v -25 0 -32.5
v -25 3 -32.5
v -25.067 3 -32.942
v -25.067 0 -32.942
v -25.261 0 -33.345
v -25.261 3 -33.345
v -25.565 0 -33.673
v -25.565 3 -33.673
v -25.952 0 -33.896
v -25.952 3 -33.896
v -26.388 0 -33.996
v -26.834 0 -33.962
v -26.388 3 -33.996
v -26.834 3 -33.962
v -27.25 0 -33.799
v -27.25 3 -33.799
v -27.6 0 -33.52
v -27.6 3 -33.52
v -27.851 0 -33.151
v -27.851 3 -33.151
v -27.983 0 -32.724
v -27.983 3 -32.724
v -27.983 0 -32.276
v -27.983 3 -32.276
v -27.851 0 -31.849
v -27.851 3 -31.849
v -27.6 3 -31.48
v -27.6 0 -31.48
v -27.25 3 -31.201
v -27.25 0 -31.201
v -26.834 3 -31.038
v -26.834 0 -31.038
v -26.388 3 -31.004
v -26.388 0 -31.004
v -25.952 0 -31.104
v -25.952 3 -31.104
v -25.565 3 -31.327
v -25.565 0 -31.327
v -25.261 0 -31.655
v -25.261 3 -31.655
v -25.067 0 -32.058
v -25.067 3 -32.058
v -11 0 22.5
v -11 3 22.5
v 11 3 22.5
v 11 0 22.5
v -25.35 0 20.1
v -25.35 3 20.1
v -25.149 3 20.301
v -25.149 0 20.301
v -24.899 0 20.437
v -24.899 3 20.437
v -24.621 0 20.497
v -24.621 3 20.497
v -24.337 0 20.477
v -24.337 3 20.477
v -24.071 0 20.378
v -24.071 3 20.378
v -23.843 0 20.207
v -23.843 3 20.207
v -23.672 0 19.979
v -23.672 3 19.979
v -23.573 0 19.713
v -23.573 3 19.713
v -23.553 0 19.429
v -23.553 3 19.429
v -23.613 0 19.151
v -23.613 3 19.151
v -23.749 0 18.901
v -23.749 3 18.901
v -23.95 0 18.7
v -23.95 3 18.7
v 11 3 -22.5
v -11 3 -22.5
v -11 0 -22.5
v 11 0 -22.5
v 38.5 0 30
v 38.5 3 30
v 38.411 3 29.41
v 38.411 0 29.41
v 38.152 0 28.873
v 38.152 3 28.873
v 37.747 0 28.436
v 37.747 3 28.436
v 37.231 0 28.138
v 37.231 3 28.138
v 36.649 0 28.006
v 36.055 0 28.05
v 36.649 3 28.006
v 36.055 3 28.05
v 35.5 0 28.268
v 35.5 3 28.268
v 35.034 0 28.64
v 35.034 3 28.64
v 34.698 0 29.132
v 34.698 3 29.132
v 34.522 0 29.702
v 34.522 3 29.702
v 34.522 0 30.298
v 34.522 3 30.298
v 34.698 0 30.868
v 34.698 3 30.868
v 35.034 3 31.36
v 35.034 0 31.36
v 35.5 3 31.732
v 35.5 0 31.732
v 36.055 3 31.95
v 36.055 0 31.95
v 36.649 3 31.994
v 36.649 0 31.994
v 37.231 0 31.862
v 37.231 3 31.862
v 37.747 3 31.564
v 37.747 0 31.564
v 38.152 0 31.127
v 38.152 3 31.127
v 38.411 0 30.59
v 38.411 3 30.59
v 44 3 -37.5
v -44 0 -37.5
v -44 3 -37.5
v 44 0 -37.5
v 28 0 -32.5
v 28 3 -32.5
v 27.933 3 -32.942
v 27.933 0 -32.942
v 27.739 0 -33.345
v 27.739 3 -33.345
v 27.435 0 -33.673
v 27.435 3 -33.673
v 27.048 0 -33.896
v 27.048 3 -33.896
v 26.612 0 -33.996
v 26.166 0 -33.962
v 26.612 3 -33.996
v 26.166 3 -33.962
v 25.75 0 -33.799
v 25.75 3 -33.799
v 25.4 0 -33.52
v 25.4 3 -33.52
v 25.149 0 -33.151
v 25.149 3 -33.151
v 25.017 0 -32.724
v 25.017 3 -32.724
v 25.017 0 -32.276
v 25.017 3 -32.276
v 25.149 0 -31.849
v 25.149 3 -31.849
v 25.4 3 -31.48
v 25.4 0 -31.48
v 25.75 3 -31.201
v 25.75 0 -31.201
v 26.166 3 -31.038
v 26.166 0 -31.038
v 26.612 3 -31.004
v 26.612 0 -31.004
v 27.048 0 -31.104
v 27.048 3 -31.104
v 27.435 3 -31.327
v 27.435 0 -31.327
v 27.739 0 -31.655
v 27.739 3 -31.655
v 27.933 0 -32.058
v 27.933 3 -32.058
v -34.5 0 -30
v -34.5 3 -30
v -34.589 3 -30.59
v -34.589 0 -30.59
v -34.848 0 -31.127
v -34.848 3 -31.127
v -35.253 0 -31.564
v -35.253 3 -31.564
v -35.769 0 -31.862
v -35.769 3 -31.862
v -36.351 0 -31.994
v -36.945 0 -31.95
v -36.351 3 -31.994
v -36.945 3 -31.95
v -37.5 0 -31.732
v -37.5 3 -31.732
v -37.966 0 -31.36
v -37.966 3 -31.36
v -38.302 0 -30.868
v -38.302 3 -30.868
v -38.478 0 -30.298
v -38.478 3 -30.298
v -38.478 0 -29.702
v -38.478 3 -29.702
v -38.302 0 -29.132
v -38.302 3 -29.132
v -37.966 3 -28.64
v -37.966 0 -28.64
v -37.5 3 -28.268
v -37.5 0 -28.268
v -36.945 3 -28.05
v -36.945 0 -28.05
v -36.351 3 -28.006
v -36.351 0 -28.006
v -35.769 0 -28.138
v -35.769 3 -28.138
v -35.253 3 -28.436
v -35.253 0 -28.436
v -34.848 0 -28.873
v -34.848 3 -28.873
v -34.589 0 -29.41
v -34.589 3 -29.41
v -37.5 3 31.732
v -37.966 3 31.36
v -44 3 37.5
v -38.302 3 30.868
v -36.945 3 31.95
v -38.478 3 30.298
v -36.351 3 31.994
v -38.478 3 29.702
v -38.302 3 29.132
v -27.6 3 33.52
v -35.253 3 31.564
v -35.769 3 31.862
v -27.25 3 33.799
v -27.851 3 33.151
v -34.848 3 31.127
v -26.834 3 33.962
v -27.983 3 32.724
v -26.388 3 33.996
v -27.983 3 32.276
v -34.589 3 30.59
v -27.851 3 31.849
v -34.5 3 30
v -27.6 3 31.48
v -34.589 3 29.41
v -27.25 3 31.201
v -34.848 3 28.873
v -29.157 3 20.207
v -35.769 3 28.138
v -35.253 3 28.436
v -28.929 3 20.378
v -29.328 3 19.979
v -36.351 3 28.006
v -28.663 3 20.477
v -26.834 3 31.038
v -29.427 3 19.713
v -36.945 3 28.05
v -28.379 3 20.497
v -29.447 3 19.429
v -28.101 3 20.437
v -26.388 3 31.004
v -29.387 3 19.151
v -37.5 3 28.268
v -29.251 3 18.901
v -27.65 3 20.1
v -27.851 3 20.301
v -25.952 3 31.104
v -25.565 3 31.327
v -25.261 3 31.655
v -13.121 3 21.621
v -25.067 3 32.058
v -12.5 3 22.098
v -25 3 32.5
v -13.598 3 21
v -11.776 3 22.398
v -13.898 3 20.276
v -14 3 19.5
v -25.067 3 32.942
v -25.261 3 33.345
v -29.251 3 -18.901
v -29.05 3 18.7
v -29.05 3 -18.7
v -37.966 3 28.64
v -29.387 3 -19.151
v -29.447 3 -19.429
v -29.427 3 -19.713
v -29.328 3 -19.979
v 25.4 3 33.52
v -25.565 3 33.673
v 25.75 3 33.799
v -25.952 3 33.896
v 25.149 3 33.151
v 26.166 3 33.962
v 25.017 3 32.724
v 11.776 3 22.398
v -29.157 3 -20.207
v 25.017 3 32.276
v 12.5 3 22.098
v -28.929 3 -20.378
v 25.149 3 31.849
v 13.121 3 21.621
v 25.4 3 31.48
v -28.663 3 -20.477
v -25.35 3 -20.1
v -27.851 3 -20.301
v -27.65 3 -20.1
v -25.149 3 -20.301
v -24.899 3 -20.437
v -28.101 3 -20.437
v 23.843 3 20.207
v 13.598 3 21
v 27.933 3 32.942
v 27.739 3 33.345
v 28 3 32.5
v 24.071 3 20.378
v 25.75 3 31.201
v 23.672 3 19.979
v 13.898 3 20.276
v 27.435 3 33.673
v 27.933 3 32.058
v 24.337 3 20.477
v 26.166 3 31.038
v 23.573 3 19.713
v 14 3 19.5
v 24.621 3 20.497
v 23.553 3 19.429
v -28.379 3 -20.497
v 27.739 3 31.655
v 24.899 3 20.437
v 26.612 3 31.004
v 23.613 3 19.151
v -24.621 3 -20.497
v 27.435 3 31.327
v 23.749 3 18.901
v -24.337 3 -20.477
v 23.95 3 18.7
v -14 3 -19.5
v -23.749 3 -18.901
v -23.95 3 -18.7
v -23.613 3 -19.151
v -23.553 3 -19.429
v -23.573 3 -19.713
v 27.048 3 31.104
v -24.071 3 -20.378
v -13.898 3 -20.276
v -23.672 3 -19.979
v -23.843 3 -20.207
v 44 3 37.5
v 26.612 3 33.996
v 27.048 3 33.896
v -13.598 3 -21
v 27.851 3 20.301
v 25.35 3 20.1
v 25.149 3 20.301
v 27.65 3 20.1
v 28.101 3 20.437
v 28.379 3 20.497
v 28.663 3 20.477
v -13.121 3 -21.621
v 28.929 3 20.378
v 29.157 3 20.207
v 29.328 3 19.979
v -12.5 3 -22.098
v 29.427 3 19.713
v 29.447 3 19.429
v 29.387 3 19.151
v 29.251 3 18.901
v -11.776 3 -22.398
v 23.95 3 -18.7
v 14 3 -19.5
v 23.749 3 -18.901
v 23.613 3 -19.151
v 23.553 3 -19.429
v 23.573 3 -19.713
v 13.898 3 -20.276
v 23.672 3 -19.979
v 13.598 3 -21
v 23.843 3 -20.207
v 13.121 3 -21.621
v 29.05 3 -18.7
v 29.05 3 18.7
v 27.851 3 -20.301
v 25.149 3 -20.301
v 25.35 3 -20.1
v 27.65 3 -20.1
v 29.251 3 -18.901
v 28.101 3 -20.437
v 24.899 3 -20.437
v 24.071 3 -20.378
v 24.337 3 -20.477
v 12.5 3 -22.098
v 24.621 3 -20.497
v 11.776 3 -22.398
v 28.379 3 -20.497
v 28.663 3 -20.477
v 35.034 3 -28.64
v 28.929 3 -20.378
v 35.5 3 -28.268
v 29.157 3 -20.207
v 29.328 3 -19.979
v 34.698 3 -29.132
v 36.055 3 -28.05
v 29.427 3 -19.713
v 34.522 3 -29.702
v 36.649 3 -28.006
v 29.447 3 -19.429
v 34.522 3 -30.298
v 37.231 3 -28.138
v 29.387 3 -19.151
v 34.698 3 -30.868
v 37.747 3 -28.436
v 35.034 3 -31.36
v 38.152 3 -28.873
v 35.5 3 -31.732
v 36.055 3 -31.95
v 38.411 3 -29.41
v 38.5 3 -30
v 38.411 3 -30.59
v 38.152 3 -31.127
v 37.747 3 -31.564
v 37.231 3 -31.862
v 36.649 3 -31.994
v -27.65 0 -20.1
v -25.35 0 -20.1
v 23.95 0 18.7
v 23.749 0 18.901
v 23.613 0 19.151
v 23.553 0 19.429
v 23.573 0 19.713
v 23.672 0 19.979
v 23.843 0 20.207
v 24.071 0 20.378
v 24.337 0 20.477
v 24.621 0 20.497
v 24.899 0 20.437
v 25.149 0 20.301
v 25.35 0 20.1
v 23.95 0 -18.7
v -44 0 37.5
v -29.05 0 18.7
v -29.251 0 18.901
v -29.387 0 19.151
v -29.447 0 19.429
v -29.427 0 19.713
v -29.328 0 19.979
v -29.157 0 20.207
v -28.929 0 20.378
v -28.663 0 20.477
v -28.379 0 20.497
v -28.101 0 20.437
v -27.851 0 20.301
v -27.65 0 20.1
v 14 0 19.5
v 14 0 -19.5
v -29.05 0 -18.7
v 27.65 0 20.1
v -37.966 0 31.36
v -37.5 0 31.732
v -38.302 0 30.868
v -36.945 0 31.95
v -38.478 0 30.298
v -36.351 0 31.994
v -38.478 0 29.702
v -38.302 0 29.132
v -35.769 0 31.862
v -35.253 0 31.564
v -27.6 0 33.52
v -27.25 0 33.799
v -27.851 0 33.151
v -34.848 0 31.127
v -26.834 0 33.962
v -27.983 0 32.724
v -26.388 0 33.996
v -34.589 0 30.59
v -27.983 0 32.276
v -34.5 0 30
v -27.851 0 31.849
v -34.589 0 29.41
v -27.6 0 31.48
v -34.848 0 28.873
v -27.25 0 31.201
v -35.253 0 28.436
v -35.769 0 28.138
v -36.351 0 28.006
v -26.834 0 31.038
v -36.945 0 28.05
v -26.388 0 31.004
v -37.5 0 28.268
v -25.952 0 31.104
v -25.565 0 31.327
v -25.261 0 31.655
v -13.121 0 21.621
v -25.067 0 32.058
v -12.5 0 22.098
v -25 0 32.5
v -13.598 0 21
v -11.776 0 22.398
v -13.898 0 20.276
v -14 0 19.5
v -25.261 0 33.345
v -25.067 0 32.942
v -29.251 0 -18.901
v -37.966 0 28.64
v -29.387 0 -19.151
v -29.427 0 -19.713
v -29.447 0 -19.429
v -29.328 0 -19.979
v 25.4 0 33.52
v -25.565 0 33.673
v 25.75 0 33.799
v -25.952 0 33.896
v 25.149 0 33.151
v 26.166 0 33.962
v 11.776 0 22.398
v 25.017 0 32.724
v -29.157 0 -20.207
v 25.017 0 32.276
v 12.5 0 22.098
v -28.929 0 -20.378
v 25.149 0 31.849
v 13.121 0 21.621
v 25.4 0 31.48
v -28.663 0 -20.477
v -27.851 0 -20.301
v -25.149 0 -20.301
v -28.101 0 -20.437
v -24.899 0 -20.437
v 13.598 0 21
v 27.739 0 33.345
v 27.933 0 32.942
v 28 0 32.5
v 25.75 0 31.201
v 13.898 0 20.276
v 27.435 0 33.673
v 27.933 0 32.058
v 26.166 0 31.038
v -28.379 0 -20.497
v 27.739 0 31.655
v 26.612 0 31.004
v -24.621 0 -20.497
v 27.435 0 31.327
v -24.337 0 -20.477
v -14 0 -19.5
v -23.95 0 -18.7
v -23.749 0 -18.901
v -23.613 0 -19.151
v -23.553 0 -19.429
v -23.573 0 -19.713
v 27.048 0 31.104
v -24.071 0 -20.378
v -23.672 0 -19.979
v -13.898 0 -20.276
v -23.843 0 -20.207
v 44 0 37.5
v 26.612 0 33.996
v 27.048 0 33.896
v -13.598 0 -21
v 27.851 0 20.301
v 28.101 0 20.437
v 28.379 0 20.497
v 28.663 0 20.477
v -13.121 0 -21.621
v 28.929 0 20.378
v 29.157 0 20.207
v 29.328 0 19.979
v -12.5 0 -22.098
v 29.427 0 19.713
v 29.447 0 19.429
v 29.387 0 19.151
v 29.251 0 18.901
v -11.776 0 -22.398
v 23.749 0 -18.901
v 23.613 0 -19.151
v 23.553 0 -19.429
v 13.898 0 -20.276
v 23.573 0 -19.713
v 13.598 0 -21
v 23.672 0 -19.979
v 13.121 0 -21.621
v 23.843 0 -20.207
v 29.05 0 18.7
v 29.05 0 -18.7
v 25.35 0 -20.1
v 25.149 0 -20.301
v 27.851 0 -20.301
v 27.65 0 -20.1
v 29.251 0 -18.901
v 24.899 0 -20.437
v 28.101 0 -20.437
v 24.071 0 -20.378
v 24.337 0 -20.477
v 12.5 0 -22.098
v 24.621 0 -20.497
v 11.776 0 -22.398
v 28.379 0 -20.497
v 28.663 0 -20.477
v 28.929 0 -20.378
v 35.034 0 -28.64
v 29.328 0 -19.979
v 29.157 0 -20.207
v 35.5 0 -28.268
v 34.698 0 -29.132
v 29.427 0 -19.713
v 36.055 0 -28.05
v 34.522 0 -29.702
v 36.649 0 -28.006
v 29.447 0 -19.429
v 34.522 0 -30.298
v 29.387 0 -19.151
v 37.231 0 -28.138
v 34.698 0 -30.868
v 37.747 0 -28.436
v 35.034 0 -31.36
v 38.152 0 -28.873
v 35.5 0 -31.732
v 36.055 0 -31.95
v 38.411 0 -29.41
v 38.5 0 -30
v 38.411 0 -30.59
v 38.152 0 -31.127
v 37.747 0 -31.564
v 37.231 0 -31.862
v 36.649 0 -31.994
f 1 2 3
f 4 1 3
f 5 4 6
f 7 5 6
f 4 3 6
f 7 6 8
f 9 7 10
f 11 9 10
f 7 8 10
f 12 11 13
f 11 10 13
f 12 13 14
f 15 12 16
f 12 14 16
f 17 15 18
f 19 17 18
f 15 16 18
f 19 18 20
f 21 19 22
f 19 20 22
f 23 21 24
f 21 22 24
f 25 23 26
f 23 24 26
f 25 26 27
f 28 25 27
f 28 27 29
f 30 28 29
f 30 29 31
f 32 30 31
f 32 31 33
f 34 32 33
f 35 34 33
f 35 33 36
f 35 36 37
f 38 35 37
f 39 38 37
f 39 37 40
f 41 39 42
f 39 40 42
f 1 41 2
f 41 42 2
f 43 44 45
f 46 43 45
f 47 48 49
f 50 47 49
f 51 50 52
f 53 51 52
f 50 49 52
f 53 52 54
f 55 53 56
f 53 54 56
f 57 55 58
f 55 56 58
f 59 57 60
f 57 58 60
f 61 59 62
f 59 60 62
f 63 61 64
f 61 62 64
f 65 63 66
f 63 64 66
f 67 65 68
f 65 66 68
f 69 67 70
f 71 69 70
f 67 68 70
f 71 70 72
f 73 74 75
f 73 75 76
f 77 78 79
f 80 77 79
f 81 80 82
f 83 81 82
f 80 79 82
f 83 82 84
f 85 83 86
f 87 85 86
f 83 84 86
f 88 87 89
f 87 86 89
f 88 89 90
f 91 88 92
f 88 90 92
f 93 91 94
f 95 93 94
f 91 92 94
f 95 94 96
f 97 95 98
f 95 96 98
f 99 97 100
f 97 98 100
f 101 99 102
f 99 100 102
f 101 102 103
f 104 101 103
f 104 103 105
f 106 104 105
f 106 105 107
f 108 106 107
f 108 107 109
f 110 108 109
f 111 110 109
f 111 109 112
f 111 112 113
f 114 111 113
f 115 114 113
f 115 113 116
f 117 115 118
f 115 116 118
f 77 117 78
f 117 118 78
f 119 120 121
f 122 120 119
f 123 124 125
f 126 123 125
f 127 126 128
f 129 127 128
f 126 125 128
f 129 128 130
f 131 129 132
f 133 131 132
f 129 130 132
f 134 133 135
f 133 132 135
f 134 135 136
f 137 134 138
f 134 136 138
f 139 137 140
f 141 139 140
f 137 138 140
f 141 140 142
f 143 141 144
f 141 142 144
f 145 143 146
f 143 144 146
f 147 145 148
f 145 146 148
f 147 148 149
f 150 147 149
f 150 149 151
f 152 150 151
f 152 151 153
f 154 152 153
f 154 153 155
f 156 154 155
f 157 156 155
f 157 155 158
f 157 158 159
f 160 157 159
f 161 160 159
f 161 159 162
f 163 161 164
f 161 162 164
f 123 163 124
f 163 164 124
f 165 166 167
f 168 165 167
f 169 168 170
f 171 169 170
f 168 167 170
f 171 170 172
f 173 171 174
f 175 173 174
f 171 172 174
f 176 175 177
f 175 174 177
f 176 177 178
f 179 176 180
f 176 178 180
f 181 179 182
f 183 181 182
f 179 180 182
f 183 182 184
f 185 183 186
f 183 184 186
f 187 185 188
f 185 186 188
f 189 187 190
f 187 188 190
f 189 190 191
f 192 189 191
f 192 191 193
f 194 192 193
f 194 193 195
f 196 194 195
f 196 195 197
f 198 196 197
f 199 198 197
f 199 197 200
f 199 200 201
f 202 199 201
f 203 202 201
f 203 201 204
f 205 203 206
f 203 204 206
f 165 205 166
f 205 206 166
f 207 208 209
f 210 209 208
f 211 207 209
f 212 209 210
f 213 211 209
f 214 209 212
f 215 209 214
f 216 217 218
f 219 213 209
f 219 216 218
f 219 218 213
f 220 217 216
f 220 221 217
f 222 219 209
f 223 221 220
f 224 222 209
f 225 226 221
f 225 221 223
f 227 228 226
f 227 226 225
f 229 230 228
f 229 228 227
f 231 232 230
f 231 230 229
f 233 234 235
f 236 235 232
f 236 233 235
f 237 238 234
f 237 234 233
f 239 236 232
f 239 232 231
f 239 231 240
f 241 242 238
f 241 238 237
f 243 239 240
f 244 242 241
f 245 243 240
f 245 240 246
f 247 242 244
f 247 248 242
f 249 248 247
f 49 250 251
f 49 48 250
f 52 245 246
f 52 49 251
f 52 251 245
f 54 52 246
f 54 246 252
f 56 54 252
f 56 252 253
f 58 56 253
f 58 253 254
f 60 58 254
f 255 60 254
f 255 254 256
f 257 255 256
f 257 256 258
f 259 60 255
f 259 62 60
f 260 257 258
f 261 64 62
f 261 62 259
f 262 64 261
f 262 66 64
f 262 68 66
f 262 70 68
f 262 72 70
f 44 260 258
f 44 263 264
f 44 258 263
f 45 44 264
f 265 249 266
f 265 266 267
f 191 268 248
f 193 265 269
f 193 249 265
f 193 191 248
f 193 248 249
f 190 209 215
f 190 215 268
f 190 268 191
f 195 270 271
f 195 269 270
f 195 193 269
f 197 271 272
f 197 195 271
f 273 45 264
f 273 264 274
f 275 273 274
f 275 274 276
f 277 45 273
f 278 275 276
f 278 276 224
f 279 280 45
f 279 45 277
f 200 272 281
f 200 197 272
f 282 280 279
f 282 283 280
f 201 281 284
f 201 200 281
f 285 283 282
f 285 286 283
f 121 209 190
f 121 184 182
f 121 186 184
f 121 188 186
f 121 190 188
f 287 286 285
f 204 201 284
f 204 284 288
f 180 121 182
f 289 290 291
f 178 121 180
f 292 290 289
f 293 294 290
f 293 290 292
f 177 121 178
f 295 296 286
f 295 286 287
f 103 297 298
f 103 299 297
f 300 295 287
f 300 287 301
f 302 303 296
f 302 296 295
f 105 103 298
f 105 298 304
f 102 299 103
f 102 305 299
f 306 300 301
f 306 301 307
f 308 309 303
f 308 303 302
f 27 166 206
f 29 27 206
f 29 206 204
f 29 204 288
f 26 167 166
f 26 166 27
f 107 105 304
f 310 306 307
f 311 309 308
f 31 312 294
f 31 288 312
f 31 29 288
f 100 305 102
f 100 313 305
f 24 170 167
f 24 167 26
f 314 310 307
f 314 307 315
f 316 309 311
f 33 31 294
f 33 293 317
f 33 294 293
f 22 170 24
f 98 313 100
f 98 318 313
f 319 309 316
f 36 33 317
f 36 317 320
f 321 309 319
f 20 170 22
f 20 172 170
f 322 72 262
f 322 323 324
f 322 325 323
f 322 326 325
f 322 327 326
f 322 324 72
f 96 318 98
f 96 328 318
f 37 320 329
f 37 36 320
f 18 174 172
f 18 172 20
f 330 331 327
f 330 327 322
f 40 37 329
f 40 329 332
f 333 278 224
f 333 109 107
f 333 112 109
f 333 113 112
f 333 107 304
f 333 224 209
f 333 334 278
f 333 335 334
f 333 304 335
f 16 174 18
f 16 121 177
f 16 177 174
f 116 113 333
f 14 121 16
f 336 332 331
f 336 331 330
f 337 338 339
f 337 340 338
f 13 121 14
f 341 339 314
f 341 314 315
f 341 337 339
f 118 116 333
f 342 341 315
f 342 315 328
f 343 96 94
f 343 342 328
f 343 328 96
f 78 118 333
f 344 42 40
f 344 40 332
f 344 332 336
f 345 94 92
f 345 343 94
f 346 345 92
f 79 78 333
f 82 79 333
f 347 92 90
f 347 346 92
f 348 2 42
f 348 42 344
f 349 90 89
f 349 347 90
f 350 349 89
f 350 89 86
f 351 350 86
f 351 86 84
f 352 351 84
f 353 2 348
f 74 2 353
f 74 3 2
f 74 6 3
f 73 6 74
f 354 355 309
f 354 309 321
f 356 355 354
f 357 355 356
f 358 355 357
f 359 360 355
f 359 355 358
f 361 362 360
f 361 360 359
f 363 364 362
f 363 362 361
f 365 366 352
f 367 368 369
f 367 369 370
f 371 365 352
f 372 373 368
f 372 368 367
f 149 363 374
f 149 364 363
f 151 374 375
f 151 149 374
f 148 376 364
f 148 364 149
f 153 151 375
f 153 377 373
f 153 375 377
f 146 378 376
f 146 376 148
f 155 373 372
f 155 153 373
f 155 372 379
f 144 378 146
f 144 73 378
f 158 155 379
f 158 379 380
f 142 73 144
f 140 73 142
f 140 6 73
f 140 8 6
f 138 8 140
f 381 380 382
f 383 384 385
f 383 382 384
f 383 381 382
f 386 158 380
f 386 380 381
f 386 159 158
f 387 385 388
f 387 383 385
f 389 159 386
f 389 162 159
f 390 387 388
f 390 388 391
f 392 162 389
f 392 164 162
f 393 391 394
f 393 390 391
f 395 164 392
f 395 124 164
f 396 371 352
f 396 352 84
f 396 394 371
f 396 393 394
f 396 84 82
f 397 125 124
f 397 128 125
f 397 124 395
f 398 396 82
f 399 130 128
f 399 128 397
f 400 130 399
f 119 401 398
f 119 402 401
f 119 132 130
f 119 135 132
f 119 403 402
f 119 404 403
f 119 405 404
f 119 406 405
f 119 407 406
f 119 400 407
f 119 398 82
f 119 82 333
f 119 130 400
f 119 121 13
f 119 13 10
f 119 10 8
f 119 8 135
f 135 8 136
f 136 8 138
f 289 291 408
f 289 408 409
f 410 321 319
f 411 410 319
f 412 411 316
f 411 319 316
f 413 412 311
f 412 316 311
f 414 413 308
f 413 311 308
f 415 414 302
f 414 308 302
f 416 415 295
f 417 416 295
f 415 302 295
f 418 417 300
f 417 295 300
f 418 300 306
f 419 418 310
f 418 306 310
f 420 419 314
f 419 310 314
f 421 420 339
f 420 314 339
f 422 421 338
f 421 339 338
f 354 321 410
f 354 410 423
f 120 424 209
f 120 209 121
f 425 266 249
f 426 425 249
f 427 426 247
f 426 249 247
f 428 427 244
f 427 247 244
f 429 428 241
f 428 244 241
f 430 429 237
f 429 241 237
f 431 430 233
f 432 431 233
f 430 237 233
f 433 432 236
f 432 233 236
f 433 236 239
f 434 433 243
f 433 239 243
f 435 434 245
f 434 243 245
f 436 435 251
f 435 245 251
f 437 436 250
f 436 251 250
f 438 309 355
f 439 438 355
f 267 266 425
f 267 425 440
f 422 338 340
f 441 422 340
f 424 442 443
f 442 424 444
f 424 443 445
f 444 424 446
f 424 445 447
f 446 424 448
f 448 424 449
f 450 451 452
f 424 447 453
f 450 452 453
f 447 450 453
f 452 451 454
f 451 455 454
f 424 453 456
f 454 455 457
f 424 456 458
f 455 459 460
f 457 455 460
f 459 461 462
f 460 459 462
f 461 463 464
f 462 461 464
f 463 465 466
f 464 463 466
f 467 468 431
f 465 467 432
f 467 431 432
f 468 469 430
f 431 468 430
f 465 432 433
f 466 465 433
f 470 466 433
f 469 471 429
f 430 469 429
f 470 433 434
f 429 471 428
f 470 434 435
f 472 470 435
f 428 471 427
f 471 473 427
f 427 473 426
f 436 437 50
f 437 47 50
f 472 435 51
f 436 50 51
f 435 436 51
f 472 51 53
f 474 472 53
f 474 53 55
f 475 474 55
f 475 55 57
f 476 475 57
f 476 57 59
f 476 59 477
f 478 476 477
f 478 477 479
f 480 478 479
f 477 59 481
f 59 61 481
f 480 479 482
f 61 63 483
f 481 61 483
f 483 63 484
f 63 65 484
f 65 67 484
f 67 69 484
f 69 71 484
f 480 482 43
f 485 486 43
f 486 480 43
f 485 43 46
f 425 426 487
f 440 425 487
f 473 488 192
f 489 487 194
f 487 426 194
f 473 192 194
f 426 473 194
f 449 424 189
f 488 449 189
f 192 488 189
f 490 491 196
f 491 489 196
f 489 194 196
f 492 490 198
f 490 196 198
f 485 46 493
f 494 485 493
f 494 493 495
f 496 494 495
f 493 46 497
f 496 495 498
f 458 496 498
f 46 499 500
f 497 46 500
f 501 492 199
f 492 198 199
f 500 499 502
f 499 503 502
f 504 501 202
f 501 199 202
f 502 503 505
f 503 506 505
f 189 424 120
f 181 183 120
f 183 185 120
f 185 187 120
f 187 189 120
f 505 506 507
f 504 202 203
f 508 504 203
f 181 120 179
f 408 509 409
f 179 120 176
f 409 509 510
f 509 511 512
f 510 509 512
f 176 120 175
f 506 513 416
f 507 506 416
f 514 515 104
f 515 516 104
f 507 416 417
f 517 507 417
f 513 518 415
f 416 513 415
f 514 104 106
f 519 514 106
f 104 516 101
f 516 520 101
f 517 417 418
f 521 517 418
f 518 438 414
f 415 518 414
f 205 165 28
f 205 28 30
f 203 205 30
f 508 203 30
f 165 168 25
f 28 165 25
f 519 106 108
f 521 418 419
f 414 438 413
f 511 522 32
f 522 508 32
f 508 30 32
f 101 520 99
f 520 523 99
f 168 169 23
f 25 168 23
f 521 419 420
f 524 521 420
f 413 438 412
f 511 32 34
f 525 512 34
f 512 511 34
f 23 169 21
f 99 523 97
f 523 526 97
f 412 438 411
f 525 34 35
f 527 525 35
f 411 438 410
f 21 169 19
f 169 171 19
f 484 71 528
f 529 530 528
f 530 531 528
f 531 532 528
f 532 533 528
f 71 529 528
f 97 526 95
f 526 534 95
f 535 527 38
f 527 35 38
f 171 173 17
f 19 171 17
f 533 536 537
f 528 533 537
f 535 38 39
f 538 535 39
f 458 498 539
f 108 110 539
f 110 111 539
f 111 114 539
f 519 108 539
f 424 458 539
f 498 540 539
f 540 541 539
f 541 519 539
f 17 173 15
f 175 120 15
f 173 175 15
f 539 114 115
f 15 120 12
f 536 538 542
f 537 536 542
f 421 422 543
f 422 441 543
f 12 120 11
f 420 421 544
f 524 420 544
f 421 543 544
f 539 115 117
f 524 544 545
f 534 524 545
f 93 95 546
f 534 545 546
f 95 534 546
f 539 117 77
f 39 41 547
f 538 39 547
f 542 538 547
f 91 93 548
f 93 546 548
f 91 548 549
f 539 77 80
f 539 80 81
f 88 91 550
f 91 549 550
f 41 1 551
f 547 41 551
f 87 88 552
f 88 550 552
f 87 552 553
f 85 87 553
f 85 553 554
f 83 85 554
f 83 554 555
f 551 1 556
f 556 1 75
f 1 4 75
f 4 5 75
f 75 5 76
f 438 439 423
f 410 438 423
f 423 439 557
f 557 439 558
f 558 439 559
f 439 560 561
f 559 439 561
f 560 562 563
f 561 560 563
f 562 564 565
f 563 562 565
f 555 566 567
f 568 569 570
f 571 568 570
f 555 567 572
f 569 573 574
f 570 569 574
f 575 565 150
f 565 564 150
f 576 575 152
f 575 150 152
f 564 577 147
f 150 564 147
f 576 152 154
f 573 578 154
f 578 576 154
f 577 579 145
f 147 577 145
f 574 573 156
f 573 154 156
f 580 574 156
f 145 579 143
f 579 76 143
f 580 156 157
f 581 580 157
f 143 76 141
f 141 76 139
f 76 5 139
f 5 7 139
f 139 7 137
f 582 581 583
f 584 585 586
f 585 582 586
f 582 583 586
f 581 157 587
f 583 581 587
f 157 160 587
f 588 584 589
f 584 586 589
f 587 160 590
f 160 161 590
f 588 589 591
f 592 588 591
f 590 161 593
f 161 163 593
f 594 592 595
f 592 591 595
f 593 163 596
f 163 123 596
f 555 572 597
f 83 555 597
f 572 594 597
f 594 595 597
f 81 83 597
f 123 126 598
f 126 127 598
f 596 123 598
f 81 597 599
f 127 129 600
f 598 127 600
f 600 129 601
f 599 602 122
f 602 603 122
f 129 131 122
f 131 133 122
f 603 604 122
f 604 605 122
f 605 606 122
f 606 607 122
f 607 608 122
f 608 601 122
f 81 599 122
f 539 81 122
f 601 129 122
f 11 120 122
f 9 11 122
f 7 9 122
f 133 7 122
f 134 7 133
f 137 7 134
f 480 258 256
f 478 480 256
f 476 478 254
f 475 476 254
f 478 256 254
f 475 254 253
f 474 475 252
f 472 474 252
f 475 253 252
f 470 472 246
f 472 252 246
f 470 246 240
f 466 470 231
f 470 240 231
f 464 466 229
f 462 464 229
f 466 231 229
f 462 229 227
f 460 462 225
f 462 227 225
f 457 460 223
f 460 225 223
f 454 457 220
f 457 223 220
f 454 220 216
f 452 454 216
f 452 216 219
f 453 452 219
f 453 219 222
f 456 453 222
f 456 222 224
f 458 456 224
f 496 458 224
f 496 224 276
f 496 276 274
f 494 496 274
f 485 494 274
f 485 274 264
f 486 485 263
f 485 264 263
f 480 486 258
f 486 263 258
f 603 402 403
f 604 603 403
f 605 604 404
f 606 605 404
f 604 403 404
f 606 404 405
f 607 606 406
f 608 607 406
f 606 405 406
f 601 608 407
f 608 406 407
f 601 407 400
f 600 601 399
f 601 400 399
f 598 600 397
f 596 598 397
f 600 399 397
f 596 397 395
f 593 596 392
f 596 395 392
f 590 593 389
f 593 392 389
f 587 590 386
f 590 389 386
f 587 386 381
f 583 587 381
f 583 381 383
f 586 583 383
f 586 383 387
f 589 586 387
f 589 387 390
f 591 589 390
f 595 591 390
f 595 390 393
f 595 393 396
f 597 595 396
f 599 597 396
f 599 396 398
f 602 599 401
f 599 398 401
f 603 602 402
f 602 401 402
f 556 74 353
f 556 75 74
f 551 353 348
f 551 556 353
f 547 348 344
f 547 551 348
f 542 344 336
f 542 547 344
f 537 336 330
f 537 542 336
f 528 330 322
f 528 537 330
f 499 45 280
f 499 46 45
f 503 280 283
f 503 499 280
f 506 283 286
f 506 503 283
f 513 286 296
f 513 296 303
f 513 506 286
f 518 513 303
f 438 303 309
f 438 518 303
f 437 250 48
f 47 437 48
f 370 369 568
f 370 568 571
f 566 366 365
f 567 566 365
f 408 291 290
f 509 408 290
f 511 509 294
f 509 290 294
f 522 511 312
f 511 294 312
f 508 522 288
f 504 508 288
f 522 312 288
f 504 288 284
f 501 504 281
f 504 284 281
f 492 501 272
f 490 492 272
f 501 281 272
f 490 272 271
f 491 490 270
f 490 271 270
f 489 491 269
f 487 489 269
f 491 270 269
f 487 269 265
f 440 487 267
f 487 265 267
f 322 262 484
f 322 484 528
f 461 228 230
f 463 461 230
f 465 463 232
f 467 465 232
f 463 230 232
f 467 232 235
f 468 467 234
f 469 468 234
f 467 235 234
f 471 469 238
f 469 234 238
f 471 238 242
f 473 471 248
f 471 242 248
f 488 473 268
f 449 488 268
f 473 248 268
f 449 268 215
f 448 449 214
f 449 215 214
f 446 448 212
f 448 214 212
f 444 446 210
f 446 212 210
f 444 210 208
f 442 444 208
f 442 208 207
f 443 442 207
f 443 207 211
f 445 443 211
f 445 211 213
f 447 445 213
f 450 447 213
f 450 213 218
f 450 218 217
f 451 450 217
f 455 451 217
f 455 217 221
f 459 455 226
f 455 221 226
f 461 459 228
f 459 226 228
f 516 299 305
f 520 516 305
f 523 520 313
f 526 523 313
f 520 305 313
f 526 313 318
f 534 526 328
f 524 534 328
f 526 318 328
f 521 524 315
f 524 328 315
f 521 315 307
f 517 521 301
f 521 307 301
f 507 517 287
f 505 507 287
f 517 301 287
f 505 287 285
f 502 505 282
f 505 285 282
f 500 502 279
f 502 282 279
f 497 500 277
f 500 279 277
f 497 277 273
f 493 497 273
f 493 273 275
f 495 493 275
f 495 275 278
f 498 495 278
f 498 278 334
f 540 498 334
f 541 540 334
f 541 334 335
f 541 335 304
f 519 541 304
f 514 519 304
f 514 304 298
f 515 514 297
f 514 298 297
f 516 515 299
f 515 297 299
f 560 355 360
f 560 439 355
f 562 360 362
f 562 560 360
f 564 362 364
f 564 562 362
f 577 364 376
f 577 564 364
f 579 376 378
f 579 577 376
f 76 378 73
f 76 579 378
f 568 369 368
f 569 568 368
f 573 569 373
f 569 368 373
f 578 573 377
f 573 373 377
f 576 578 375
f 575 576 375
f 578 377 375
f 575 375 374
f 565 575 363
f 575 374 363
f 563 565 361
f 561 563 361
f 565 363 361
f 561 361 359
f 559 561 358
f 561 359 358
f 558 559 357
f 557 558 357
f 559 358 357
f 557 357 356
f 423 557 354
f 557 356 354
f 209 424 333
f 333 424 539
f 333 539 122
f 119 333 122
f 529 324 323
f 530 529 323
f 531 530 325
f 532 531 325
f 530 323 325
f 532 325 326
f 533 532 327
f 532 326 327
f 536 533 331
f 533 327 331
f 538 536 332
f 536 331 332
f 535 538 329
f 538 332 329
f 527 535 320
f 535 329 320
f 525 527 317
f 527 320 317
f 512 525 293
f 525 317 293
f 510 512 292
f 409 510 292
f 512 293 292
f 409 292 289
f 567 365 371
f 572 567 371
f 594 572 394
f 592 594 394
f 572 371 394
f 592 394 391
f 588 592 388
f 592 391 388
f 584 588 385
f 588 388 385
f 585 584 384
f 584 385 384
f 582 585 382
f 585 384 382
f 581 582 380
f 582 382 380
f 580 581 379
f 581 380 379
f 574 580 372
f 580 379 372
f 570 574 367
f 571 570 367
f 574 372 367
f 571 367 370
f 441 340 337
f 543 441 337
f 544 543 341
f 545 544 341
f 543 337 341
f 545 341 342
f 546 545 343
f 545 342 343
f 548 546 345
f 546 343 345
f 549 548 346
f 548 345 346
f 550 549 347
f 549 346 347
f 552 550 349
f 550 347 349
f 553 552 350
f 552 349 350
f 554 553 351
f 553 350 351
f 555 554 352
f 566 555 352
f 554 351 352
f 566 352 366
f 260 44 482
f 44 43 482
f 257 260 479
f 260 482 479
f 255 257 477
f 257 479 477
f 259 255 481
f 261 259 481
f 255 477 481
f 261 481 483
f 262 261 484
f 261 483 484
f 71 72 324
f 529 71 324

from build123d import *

# Parameters (mm, degrees)
SKETCH_1_W          = 88
SKETCH_1_H          = 75
EXTRUDE_1_DEPTH     = 3
SKETCH_2_R          = 1.5
SKETCH_2_R_2        = 1
SKETCH_2_W          = 5.1
SKETCH_2_H          = 40.2
SKETCH_2_R_3        = 2
SKETCH_2_W_2        = 28
SKETCH_2_H_2        = 45
CUT_EXTRUDE_1_DEPTH = 3
FILLET_1_R          = 3


with BuildPart() as part:
    # ｽｹｯﾁ1 → ﾎﾞｽ - 押し出し1 (new body)
    with BuildSketch(Plane(origin=(0, 0, 0), x_dir=(1, 0, 0), z_dir=(0, 1, 0))):
        Rectangle(SKETCH_1_W, SKETCH_1_H)
    extrude(amount=EXTRUDE_1_DEPTH)

    # ｽｹｯﾁ2 → ｶｯﾄ - 押し出し1 (cut)
    with BuildSketch(Plane(origin=(0, 3, 0), x_dir=(1, 0, 0), z_dir=(0, 1, 0))):
        with Locations((-26.5, 32.5)):
            Circle(SKETCH_2_R)
        with Locations((26.5, 32.5)):
            Circle(SKETCH_2_R)
        with Locations((-28.45, -19.5)):
            Circle(SKETCH_2_R_2)
        with Locations((-24.55, -19.5)):
            Circle(SKETCH_2_R_2)
        with Locations((-26.5, 0)):
            Rectangle(SKETCH_2_W, SKETCH_2_H)
        with Locations((-28.45, 19.5)):
            Circle(SKETCH_2_R_2)
        with Locations((-24.55, 19.5)):
            Circle(SKETCH_2_R_2)
        with Locations((26.5, 0)):
            Rectangle(SKETCH_2_W, SKETCH_2_H)
        with Locations((24.55, 19.5)):
            Circle(SKETCH_2_R_2)
        with Locations((28.45, 19.5)):
            Circle(SKETCH_2_R_2)
        with Locations((24.55, -19.5)):
            Circle(SKETCH_2_R_2)
        with Locations((28.45, -19.5)):
            Circle(SKETCH_2_R_2)
        with Locations((-26.5, -32.5)):
            Circle(SKETCH_2_R)
        with Locations((26.5, -32.5)):
            Circle(SKETCH_2_R)
        with Locations((-36.5, -30)):
            Circle(SKETCH_2_R_3)
        with Locations((-36.5, 30)):
            Circle(SKETCH_2_R_3)
        with Locations((36.5, 30)):
            Circle(SKETCH_2_R_3)
        with Locations((36.5, -30)):
            Circle(SKETCH_2_R_3)
        Rectangle(SKETCH_2_W_2, SKETCH_2_H_2)
    extrude(amount=-CUT_EXTRUDE_1_DEPTH, mode=Mode.SUBTRACT)

    # ﾌｨﾚｯﾄ1
    fillet_1_edges = [part.edges().sort_by_distance(p)[0] for p in [
        (-14, 1.5, -22.5),
        (14, 1.5, -22.5),
        (14, 1.5, 22.5),
        (-14, 1.5, 22.5),
    ]]
    fillet(fillet_1_edges, radius=FILLET_1_R)


solid = part.part
